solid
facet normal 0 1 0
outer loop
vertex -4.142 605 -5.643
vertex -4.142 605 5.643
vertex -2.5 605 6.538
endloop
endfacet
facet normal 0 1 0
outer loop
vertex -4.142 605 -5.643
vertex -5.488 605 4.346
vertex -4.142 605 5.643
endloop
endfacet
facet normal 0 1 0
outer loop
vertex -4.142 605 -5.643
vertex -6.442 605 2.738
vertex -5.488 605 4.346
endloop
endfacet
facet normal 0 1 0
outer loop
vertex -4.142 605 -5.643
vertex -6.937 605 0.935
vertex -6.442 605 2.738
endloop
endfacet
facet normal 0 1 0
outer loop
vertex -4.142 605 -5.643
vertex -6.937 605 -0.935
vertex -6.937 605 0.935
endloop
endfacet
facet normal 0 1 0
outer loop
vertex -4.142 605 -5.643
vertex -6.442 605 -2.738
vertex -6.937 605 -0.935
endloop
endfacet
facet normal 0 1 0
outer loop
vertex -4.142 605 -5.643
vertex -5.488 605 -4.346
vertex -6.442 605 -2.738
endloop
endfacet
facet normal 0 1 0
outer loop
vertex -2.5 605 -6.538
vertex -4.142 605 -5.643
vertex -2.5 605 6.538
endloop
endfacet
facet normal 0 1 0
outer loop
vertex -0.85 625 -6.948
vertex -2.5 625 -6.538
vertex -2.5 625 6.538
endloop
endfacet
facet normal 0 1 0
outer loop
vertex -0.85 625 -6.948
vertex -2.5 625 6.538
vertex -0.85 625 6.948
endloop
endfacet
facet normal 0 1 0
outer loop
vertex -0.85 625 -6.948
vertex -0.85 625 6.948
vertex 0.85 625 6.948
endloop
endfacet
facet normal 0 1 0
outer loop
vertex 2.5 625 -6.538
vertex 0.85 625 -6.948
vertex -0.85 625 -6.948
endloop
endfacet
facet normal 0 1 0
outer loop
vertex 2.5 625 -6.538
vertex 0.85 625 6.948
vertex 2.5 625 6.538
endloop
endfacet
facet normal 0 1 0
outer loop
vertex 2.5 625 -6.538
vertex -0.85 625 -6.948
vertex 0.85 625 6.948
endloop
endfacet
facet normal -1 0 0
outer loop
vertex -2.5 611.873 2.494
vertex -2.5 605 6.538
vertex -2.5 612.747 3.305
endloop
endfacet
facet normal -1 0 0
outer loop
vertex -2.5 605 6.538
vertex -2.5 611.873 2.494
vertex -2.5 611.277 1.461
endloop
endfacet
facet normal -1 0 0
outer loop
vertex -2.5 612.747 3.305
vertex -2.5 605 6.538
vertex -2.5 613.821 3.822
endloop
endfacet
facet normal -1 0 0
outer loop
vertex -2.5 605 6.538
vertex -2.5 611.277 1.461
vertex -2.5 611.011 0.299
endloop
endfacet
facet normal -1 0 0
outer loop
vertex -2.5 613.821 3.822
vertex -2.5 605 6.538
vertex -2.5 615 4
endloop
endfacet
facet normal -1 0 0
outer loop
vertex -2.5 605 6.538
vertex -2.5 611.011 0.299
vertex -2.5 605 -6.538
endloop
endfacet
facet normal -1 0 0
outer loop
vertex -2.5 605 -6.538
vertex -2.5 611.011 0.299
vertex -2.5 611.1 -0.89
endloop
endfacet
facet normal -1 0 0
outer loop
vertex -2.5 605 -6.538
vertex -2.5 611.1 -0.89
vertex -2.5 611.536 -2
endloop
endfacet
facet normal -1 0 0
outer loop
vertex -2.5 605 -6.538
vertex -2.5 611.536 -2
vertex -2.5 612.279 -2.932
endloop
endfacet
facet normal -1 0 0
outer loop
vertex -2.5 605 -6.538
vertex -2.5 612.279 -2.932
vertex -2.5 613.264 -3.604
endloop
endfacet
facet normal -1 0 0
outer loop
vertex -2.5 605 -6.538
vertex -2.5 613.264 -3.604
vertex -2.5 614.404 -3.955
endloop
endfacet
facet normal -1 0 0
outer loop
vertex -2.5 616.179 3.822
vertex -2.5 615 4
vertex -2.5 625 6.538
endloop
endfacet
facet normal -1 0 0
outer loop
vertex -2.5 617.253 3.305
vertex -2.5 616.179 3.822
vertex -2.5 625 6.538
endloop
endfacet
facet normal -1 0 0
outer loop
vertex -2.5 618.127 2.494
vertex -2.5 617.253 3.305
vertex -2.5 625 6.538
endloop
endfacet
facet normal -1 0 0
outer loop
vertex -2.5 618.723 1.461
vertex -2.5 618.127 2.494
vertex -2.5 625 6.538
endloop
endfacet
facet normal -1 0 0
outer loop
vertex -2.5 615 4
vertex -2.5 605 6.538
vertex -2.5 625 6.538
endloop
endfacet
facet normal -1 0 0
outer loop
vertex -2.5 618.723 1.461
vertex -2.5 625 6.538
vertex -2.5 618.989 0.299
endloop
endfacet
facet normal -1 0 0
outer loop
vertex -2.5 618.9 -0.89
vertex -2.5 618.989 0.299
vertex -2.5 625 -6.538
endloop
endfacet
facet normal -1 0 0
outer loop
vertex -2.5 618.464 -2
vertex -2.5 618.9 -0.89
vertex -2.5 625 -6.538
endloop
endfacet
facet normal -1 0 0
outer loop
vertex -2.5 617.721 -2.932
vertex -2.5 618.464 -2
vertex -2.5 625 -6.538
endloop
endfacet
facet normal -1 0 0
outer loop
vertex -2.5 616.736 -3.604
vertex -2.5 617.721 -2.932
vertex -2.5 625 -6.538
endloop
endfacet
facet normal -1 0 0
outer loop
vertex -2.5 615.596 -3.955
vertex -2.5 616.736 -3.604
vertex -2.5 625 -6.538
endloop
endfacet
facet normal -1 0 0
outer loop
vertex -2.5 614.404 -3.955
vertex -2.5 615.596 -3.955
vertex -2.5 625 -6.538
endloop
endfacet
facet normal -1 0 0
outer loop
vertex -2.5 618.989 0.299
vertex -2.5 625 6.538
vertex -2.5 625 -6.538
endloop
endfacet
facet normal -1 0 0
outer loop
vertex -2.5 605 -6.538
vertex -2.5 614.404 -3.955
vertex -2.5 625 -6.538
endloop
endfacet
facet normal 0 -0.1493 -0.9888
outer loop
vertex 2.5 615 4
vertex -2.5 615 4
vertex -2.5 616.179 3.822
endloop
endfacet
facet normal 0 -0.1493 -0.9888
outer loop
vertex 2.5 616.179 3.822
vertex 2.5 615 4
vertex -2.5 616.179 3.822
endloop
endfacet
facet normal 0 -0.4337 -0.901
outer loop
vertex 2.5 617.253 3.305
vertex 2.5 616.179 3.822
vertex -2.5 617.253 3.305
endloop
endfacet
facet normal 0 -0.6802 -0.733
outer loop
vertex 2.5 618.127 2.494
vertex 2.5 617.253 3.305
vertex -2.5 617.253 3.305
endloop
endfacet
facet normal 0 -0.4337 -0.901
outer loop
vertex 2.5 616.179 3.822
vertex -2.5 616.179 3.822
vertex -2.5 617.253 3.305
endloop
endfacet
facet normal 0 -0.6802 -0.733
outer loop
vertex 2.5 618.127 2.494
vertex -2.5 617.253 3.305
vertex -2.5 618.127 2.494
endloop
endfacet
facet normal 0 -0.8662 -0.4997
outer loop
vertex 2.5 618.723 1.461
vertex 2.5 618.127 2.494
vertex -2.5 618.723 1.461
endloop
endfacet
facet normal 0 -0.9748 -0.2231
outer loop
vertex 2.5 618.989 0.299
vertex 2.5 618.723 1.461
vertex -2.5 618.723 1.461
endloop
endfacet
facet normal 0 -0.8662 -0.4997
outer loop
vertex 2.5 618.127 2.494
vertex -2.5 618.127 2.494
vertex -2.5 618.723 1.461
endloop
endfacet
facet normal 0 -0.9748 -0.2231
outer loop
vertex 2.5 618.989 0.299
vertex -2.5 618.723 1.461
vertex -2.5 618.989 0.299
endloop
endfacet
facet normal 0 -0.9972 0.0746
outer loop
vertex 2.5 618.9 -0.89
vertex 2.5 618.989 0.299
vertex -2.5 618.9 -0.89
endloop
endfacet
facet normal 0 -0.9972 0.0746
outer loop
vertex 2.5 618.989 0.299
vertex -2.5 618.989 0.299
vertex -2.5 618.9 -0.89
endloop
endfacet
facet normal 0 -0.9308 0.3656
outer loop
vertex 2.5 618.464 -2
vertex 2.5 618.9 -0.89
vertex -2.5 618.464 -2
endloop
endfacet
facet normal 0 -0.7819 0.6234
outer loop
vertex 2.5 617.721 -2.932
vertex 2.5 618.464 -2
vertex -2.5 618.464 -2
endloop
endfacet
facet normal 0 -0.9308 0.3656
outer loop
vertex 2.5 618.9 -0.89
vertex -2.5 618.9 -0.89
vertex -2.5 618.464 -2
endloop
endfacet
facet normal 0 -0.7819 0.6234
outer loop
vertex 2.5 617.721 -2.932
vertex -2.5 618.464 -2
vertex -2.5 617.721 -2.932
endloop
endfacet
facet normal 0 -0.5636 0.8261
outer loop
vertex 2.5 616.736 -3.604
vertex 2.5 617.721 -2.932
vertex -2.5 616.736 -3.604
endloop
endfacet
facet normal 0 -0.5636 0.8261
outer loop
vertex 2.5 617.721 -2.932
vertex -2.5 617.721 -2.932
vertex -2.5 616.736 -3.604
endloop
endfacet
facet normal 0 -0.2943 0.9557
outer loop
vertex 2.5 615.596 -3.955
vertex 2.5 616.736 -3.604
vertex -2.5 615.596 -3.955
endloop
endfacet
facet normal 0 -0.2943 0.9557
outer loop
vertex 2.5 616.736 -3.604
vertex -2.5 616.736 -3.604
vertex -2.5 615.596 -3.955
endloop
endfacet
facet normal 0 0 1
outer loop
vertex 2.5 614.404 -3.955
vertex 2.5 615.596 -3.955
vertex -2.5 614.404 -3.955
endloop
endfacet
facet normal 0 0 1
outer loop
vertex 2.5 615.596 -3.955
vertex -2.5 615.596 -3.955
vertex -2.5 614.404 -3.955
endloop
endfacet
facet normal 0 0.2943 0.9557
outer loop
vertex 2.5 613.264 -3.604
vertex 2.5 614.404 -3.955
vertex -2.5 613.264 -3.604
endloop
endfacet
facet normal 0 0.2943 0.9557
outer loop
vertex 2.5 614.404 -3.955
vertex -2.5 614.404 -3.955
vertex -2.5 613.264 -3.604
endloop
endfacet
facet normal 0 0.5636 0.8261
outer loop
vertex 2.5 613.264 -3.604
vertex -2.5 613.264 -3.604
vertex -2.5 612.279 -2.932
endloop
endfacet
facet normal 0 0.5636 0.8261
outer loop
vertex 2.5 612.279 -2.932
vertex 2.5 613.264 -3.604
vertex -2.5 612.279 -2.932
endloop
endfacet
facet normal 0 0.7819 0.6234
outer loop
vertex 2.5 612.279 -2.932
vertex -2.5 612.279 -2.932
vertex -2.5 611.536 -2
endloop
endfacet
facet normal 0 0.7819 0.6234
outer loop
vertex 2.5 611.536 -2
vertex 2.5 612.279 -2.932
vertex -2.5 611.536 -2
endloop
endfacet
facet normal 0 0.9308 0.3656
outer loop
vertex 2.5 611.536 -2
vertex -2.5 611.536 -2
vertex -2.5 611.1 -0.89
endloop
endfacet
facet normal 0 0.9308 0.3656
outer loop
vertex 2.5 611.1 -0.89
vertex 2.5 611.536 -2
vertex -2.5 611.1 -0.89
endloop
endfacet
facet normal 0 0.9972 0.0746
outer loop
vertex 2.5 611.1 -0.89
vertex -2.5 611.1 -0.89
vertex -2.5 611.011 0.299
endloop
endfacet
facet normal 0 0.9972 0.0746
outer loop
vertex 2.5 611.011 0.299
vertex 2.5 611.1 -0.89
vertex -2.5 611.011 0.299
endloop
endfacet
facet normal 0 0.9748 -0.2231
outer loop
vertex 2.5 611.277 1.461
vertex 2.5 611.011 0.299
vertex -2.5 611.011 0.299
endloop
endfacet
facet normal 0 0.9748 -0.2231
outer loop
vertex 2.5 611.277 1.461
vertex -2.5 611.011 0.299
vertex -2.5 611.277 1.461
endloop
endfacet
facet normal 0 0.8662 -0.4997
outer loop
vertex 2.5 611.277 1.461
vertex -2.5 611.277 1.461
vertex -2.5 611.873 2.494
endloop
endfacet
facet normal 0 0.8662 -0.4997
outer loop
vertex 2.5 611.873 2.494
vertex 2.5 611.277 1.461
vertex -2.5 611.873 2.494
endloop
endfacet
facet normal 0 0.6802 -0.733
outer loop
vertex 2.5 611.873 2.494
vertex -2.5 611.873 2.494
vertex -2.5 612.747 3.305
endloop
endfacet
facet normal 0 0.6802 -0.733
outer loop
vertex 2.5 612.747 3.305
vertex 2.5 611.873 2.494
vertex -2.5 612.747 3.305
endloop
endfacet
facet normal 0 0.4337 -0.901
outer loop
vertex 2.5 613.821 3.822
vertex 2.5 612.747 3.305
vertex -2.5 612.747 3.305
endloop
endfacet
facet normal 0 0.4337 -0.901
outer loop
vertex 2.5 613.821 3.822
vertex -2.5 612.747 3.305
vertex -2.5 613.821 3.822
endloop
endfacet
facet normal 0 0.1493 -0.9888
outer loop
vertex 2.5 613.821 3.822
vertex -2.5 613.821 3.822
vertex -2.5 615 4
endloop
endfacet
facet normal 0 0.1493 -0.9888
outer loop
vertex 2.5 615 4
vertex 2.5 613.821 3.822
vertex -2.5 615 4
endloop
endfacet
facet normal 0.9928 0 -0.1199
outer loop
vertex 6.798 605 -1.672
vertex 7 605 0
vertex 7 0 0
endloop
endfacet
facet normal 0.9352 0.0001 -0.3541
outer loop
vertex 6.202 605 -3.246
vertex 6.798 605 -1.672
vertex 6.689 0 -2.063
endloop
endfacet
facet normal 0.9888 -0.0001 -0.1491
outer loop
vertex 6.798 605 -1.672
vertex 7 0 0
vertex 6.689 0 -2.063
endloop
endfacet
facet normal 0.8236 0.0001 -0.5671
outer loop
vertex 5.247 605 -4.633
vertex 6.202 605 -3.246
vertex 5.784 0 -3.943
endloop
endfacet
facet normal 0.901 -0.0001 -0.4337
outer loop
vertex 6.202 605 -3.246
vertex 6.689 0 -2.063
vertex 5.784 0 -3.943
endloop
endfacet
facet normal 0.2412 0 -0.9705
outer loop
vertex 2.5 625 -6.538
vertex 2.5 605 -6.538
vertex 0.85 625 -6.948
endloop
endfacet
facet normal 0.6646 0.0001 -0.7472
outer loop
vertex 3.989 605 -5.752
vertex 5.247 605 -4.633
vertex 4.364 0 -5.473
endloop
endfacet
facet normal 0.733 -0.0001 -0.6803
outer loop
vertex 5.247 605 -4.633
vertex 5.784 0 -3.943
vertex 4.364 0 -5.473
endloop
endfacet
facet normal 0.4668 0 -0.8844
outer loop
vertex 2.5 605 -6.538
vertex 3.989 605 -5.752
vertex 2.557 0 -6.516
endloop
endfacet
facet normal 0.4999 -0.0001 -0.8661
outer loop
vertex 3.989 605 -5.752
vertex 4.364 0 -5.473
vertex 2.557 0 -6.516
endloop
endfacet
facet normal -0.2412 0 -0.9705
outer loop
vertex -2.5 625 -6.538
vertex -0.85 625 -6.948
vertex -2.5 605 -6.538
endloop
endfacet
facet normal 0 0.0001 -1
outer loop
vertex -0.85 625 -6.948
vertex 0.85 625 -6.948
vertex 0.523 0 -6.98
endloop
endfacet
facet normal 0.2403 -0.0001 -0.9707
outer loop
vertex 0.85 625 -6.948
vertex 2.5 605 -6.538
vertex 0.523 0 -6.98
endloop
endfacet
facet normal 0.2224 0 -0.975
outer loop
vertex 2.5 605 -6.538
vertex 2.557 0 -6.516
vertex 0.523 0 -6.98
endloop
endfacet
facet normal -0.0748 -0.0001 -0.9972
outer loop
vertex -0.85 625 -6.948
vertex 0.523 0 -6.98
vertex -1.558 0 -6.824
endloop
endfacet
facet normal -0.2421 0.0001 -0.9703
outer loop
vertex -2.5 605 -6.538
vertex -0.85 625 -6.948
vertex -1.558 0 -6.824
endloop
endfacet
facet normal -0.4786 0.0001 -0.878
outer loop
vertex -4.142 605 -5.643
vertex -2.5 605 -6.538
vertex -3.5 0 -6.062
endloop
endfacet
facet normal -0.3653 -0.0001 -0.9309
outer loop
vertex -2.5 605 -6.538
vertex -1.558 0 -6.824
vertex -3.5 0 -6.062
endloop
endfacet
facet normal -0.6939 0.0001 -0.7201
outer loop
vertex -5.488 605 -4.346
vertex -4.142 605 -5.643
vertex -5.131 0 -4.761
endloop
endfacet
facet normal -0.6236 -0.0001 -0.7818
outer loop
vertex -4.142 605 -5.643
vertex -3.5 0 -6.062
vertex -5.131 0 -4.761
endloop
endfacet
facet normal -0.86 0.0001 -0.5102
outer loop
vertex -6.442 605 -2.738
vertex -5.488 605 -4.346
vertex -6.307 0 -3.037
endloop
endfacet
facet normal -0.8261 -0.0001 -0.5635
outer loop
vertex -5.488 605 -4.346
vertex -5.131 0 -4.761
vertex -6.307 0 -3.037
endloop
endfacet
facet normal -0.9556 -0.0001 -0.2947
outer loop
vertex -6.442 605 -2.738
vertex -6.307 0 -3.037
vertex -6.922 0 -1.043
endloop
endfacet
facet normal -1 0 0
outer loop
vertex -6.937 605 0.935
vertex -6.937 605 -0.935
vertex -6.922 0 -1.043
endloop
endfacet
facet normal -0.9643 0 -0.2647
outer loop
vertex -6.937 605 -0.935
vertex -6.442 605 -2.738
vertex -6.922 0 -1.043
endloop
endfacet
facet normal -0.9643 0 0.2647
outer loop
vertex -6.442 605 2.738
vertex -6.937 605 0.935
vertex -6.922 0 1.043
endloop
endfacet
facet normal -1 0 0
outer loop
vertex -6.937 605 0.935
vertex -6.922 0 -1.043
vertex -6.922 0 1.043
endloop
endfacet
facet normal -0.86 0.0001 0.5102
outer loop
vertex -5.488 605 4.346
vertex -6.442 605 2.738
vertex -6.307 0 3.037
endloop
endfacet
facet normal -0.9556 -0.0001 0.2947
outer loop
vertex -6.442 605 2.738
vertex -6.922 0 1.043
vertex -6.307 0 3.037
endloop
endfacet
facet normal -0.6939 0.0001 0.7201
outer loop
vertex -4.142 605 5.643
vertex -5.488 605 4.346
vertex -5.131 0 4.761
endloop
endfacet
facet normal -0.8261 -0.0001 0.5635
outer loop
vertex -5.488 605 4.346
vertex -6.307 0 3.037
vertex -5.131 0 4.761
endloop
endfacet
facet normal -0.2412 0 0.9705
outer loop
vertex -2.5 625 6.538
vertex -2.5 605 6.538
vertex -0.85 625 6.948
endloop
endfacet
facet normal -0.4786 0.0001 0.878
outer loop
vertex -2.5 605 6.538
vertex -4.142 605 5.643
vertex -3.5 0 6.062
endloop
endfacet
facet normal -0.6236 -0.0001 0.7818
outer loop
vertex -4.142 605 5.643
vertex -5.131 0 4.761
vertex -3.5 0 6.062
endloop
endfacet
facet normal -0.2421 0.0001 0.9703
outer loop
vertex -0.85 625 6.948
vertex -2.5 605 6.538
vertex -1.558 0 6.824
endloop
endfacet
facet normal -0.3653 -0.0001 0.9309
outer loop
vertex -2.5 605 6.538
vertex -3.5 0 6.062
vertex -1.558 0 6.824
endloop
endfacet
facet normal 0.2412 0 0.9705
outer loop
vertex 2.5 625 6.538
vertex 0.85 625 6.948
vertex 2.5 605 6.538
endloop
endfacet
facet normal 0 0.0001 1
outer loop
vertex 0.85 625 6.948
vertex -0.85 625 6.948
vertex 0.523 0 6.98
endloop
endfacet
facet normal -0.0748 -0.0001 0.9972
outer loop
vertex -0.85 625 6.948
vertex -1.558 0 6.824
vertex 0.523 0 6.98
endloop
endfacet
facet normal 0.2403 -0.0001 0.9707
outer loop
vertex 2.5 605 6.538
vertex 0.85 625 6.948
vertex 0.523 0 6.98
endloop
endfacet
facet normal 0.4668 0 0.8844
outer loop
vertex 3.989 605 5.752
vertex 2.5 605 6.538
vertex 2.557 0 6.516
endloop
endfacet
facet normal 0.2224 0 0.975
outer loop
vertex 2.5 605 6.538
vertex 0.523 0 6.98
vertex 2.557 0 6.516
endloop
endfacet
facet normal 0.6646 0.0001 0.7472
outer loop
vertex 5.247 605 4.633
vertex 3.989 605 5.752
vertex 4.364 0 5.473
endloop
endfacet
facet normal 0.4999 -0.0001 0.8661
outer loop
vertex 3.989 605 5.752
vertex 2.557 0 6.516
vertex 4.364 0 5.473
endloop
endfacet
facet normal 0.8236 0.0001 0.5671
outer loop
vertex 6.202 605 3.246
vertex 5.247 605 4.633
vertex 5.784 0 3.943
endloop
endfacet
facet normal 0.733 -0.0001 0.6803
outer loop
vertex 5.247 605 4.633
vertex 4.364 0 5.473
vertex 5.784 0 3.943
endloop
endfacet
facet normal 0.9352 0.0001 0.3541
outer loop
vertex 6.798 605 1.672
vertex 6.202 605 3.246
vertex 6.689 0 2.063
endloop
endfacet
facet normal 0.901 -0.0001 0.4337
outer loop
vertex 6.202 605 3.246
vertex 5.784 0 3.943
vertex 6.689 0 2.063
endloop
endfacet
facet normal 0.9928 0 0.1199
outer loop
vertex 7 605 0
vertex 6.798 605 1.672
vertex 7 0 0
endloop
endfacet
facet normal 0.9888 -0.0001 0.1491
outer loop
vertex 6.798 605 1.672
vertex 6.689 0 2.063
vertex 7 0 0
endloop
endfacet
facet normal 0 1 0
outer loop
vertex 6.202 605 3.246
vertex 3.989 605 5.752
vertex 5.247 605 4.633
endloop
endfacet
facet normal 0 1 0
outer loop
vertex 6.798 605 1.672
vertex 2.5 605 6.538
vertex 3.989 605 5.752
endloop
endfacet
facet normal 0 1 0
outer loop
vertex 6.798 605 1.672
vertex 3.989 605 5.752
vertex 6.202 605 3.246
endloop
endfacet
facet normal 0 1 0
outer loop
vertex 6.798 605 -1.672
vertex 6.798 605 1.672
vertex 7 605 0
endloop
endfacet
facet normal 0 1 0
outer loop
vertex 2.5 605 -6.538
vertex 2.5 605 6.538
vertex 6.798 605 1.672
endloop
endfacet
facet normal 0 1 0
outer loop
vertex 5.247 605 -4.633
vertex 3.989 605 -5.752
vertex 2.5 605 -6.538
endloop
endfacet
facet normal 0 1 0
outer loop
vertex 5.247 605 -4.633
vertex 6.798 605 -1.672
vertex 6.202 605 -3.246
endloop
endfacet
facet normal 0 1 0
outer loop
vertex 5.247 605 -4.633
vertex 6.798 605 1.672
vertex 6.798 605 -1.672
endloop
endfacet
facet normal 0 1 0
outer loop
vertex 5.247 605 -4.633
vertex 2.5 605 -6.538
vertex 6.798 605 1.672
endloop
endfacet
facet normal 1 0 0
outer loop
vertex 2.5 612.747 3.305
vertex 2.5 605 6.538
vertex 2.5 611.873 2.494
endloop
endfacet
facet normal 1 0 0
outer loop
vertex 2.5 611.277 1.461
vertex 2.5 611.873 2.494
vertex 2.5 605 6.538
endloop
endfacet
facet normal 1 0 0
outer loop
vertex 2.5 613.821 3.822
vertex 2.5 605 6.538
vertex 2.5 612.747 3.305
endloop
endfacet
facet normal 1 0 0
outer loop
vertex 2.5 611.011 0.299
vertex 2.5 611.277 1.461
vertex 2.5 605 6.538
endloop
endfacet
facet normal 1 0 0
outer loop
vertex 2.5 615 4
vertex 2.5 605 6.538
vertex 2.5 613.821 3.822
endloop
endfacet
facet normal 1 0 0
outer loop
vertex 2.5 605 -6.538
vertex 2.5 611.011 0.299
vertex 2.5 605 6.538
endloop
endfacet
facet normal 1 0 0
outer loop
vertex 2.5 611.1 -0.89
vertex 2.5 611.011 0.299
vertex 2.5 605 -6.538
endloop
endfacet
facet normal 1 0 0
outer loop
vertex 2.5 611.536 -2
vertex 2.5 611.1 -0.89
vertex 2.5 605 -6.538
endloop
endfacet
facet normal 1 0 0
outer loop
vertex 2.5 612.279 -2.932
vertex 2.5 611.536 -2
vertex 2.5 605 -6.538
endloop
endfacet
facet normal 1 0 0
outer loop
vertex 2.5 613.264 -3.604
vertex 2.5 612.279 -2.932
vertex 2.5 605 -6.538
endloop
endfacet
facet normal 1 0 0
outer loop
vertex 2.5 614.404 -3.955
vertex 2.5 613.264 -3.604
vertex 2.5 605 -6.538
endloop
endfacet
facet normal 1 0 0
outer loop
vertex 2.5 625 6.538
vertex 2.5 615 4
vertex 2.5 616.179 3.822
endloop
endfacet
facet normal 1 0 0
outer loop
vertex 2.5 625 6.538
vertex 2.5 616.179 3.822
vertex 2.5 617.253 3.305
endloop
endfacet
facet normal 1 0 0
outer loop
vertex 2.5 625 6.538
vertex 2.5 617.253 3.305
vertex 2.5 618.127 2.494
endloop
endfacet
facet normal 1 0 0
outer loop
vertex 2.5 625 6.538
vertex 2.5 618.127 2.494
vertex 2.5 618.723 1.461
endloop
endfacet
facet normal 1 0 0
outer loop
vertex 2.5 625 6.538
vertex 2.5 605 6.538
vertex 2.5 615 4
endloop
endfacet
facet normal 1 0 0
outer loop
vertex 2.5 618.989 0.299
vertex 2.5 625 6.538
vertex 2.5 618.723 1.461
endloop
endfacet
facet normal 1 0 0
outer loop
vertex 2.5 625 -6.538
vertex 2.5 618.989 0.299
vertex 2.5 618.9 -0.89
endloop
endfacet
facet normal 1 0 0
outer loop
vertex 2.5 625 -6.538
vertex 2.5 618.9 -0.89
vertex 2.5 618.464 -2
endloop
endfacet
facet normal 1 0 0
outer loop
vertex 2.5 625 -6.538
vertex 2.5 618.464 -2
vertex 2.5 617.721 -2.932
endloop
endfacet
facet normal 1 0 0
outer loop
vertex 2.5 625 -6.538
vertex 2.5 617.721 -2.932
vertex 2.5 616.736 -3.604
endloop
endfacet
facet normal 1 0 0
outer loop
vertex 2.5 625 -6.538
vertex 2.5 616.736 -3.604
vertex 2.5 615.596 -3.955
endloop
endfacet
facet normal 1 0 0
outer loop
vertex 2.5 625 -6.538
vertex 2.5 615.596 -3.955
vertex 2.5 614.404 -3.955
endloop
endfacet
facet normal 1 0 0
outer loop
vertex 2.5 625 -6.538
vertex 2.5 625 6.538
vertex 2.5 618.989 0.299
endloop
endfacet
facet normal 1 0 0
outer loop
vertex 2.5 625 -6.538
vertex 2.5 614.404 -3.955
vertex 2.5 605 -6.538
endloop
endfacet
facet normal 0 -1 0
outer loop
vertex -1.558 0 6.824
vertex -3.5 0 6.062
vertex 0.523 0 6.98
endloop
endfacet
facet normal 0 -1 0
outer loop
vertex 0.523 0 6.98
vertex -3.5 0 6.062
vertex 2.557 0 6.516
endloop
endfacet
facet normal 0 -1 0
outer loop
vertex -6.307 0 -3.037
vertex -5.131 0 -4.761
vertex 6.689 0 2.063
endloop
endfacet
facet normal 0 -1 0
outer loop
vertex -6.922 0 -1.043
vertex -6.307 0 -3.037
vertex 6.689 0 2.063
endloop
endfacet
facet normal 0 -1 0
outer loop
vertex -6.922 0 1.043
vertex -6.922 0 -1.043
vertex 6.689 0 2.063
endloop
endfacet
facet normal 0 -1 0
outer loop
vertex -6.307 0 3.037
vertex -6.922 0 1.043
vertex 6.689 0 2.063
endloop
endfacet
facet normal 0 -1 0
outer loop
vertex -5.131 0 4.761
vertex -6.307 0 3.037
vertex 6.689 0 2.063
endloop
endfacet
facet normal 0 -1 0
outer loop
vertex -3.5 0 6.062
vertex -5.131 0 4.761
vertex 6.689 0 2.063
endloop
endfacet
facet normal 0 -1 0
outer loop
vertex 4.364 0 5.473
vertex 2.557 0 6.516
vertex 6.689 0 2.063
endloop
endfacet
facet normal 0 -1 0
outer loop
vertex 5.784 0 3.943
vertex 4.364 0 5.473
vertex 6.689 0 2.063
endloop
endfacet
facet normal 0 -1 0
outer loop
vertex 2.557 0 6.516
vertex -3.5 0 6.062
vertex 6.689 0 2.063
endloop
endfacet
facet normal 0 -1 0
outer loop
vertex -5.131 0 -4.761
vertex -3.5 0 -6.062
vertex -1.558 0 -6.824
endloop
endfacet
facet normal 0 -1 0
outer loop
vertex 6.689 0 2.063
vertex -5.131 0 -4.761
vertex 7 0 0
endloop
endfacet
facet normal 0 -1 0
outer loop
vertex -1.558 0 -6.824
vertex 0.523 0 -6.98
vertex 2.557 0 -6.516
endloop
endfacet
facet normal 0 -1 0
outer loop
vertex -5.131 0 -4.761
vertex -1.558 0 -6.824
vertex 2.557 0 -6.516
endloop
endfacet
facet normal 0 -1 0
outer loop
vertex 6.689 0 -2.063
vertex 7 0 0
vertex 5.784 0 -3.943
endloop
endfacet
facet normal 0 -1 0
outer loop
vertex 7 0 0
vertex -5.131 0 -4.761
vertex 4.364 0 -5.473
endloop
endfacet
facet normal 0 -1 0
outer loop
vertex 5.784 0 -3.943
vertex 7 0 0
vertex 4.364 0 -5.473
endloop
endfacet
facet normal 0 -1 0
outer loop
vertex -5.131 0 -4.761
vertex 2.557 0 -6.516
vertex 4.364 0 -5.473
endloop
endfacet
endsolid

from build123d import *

# Parameters (mm, degrees)
SKETCH_1_R           = 7
EXTRUDE_1_DEPTH      = 15
SKETCH_2_R           = 7
EXTRUDE_2_DEPTH      = 610
SKETCH_3_OUTSIDE_W   = 141.062
SKETCH_3_OUTSIDE_H   = 141.062
SKETCH_3_OUTSIDE_W_2 = 5
SKETCH_3_OUTSIDE_H_2 = 20
CUT_EXTRUDE_1_DEPTH  = 20
SKETCH_4_R           = 4
CUT_EXTRUDE_2_DEPTH  = 20


with BuildPart() as part:
    # 草图1 → 凸台-拉伸1 (new body)
    with BuildSketch(Plane(origin=(0, 0, 0), x_dir=(1, 0, 0), z_dir=(0, 1, 0))):
        Circle(SKETCH_1_R)
    extrude(amount=EXTRUDE_1_DEPTH)

    # 草图2 → 凸台-拉伸2 (add)
    with BuildSketch(Plane(origin=(0, 15, 0), x_dir=(1, 0, 0), z_dir=(0, 1, 0))):
        Circle(SKETCH_2_R)
    extrude(amount=EXTRUDE_2_DEPTH)

    # 草图3 outside → 切除-拉伸1 (cut)
    with BuildSketch(Plane(origin=(0, 625, 0), x_dir=(1, 0, 0), z_dir=(0, 1, 0))):
        Rectangle(SKETCH_3_OUTSIDE_W, SKETCH_3_OUTSIDE_H)
        Rectangle(SKETCH_3_OUTSIDE_W_2, SKETCH_3_OUTSIDE_H_2, mode=Mode.SUBTRACT)
    extrude(amount=-CUT_EXTRUDE_1_DEPTH, mode=Mode.SUBTRACT)

    # 草图4 → 切除-拉伸2 (cut)
    with BuildSketch(Plane.ZY.offset(2.5)):
        with Locations((0, 615)):
            Circle(SKETCH_4_R)
    extrude(amount=-CUT_EXTRUDE_2_DEPTH, mode=Mode.SUBTRACT)


solid = part.part
